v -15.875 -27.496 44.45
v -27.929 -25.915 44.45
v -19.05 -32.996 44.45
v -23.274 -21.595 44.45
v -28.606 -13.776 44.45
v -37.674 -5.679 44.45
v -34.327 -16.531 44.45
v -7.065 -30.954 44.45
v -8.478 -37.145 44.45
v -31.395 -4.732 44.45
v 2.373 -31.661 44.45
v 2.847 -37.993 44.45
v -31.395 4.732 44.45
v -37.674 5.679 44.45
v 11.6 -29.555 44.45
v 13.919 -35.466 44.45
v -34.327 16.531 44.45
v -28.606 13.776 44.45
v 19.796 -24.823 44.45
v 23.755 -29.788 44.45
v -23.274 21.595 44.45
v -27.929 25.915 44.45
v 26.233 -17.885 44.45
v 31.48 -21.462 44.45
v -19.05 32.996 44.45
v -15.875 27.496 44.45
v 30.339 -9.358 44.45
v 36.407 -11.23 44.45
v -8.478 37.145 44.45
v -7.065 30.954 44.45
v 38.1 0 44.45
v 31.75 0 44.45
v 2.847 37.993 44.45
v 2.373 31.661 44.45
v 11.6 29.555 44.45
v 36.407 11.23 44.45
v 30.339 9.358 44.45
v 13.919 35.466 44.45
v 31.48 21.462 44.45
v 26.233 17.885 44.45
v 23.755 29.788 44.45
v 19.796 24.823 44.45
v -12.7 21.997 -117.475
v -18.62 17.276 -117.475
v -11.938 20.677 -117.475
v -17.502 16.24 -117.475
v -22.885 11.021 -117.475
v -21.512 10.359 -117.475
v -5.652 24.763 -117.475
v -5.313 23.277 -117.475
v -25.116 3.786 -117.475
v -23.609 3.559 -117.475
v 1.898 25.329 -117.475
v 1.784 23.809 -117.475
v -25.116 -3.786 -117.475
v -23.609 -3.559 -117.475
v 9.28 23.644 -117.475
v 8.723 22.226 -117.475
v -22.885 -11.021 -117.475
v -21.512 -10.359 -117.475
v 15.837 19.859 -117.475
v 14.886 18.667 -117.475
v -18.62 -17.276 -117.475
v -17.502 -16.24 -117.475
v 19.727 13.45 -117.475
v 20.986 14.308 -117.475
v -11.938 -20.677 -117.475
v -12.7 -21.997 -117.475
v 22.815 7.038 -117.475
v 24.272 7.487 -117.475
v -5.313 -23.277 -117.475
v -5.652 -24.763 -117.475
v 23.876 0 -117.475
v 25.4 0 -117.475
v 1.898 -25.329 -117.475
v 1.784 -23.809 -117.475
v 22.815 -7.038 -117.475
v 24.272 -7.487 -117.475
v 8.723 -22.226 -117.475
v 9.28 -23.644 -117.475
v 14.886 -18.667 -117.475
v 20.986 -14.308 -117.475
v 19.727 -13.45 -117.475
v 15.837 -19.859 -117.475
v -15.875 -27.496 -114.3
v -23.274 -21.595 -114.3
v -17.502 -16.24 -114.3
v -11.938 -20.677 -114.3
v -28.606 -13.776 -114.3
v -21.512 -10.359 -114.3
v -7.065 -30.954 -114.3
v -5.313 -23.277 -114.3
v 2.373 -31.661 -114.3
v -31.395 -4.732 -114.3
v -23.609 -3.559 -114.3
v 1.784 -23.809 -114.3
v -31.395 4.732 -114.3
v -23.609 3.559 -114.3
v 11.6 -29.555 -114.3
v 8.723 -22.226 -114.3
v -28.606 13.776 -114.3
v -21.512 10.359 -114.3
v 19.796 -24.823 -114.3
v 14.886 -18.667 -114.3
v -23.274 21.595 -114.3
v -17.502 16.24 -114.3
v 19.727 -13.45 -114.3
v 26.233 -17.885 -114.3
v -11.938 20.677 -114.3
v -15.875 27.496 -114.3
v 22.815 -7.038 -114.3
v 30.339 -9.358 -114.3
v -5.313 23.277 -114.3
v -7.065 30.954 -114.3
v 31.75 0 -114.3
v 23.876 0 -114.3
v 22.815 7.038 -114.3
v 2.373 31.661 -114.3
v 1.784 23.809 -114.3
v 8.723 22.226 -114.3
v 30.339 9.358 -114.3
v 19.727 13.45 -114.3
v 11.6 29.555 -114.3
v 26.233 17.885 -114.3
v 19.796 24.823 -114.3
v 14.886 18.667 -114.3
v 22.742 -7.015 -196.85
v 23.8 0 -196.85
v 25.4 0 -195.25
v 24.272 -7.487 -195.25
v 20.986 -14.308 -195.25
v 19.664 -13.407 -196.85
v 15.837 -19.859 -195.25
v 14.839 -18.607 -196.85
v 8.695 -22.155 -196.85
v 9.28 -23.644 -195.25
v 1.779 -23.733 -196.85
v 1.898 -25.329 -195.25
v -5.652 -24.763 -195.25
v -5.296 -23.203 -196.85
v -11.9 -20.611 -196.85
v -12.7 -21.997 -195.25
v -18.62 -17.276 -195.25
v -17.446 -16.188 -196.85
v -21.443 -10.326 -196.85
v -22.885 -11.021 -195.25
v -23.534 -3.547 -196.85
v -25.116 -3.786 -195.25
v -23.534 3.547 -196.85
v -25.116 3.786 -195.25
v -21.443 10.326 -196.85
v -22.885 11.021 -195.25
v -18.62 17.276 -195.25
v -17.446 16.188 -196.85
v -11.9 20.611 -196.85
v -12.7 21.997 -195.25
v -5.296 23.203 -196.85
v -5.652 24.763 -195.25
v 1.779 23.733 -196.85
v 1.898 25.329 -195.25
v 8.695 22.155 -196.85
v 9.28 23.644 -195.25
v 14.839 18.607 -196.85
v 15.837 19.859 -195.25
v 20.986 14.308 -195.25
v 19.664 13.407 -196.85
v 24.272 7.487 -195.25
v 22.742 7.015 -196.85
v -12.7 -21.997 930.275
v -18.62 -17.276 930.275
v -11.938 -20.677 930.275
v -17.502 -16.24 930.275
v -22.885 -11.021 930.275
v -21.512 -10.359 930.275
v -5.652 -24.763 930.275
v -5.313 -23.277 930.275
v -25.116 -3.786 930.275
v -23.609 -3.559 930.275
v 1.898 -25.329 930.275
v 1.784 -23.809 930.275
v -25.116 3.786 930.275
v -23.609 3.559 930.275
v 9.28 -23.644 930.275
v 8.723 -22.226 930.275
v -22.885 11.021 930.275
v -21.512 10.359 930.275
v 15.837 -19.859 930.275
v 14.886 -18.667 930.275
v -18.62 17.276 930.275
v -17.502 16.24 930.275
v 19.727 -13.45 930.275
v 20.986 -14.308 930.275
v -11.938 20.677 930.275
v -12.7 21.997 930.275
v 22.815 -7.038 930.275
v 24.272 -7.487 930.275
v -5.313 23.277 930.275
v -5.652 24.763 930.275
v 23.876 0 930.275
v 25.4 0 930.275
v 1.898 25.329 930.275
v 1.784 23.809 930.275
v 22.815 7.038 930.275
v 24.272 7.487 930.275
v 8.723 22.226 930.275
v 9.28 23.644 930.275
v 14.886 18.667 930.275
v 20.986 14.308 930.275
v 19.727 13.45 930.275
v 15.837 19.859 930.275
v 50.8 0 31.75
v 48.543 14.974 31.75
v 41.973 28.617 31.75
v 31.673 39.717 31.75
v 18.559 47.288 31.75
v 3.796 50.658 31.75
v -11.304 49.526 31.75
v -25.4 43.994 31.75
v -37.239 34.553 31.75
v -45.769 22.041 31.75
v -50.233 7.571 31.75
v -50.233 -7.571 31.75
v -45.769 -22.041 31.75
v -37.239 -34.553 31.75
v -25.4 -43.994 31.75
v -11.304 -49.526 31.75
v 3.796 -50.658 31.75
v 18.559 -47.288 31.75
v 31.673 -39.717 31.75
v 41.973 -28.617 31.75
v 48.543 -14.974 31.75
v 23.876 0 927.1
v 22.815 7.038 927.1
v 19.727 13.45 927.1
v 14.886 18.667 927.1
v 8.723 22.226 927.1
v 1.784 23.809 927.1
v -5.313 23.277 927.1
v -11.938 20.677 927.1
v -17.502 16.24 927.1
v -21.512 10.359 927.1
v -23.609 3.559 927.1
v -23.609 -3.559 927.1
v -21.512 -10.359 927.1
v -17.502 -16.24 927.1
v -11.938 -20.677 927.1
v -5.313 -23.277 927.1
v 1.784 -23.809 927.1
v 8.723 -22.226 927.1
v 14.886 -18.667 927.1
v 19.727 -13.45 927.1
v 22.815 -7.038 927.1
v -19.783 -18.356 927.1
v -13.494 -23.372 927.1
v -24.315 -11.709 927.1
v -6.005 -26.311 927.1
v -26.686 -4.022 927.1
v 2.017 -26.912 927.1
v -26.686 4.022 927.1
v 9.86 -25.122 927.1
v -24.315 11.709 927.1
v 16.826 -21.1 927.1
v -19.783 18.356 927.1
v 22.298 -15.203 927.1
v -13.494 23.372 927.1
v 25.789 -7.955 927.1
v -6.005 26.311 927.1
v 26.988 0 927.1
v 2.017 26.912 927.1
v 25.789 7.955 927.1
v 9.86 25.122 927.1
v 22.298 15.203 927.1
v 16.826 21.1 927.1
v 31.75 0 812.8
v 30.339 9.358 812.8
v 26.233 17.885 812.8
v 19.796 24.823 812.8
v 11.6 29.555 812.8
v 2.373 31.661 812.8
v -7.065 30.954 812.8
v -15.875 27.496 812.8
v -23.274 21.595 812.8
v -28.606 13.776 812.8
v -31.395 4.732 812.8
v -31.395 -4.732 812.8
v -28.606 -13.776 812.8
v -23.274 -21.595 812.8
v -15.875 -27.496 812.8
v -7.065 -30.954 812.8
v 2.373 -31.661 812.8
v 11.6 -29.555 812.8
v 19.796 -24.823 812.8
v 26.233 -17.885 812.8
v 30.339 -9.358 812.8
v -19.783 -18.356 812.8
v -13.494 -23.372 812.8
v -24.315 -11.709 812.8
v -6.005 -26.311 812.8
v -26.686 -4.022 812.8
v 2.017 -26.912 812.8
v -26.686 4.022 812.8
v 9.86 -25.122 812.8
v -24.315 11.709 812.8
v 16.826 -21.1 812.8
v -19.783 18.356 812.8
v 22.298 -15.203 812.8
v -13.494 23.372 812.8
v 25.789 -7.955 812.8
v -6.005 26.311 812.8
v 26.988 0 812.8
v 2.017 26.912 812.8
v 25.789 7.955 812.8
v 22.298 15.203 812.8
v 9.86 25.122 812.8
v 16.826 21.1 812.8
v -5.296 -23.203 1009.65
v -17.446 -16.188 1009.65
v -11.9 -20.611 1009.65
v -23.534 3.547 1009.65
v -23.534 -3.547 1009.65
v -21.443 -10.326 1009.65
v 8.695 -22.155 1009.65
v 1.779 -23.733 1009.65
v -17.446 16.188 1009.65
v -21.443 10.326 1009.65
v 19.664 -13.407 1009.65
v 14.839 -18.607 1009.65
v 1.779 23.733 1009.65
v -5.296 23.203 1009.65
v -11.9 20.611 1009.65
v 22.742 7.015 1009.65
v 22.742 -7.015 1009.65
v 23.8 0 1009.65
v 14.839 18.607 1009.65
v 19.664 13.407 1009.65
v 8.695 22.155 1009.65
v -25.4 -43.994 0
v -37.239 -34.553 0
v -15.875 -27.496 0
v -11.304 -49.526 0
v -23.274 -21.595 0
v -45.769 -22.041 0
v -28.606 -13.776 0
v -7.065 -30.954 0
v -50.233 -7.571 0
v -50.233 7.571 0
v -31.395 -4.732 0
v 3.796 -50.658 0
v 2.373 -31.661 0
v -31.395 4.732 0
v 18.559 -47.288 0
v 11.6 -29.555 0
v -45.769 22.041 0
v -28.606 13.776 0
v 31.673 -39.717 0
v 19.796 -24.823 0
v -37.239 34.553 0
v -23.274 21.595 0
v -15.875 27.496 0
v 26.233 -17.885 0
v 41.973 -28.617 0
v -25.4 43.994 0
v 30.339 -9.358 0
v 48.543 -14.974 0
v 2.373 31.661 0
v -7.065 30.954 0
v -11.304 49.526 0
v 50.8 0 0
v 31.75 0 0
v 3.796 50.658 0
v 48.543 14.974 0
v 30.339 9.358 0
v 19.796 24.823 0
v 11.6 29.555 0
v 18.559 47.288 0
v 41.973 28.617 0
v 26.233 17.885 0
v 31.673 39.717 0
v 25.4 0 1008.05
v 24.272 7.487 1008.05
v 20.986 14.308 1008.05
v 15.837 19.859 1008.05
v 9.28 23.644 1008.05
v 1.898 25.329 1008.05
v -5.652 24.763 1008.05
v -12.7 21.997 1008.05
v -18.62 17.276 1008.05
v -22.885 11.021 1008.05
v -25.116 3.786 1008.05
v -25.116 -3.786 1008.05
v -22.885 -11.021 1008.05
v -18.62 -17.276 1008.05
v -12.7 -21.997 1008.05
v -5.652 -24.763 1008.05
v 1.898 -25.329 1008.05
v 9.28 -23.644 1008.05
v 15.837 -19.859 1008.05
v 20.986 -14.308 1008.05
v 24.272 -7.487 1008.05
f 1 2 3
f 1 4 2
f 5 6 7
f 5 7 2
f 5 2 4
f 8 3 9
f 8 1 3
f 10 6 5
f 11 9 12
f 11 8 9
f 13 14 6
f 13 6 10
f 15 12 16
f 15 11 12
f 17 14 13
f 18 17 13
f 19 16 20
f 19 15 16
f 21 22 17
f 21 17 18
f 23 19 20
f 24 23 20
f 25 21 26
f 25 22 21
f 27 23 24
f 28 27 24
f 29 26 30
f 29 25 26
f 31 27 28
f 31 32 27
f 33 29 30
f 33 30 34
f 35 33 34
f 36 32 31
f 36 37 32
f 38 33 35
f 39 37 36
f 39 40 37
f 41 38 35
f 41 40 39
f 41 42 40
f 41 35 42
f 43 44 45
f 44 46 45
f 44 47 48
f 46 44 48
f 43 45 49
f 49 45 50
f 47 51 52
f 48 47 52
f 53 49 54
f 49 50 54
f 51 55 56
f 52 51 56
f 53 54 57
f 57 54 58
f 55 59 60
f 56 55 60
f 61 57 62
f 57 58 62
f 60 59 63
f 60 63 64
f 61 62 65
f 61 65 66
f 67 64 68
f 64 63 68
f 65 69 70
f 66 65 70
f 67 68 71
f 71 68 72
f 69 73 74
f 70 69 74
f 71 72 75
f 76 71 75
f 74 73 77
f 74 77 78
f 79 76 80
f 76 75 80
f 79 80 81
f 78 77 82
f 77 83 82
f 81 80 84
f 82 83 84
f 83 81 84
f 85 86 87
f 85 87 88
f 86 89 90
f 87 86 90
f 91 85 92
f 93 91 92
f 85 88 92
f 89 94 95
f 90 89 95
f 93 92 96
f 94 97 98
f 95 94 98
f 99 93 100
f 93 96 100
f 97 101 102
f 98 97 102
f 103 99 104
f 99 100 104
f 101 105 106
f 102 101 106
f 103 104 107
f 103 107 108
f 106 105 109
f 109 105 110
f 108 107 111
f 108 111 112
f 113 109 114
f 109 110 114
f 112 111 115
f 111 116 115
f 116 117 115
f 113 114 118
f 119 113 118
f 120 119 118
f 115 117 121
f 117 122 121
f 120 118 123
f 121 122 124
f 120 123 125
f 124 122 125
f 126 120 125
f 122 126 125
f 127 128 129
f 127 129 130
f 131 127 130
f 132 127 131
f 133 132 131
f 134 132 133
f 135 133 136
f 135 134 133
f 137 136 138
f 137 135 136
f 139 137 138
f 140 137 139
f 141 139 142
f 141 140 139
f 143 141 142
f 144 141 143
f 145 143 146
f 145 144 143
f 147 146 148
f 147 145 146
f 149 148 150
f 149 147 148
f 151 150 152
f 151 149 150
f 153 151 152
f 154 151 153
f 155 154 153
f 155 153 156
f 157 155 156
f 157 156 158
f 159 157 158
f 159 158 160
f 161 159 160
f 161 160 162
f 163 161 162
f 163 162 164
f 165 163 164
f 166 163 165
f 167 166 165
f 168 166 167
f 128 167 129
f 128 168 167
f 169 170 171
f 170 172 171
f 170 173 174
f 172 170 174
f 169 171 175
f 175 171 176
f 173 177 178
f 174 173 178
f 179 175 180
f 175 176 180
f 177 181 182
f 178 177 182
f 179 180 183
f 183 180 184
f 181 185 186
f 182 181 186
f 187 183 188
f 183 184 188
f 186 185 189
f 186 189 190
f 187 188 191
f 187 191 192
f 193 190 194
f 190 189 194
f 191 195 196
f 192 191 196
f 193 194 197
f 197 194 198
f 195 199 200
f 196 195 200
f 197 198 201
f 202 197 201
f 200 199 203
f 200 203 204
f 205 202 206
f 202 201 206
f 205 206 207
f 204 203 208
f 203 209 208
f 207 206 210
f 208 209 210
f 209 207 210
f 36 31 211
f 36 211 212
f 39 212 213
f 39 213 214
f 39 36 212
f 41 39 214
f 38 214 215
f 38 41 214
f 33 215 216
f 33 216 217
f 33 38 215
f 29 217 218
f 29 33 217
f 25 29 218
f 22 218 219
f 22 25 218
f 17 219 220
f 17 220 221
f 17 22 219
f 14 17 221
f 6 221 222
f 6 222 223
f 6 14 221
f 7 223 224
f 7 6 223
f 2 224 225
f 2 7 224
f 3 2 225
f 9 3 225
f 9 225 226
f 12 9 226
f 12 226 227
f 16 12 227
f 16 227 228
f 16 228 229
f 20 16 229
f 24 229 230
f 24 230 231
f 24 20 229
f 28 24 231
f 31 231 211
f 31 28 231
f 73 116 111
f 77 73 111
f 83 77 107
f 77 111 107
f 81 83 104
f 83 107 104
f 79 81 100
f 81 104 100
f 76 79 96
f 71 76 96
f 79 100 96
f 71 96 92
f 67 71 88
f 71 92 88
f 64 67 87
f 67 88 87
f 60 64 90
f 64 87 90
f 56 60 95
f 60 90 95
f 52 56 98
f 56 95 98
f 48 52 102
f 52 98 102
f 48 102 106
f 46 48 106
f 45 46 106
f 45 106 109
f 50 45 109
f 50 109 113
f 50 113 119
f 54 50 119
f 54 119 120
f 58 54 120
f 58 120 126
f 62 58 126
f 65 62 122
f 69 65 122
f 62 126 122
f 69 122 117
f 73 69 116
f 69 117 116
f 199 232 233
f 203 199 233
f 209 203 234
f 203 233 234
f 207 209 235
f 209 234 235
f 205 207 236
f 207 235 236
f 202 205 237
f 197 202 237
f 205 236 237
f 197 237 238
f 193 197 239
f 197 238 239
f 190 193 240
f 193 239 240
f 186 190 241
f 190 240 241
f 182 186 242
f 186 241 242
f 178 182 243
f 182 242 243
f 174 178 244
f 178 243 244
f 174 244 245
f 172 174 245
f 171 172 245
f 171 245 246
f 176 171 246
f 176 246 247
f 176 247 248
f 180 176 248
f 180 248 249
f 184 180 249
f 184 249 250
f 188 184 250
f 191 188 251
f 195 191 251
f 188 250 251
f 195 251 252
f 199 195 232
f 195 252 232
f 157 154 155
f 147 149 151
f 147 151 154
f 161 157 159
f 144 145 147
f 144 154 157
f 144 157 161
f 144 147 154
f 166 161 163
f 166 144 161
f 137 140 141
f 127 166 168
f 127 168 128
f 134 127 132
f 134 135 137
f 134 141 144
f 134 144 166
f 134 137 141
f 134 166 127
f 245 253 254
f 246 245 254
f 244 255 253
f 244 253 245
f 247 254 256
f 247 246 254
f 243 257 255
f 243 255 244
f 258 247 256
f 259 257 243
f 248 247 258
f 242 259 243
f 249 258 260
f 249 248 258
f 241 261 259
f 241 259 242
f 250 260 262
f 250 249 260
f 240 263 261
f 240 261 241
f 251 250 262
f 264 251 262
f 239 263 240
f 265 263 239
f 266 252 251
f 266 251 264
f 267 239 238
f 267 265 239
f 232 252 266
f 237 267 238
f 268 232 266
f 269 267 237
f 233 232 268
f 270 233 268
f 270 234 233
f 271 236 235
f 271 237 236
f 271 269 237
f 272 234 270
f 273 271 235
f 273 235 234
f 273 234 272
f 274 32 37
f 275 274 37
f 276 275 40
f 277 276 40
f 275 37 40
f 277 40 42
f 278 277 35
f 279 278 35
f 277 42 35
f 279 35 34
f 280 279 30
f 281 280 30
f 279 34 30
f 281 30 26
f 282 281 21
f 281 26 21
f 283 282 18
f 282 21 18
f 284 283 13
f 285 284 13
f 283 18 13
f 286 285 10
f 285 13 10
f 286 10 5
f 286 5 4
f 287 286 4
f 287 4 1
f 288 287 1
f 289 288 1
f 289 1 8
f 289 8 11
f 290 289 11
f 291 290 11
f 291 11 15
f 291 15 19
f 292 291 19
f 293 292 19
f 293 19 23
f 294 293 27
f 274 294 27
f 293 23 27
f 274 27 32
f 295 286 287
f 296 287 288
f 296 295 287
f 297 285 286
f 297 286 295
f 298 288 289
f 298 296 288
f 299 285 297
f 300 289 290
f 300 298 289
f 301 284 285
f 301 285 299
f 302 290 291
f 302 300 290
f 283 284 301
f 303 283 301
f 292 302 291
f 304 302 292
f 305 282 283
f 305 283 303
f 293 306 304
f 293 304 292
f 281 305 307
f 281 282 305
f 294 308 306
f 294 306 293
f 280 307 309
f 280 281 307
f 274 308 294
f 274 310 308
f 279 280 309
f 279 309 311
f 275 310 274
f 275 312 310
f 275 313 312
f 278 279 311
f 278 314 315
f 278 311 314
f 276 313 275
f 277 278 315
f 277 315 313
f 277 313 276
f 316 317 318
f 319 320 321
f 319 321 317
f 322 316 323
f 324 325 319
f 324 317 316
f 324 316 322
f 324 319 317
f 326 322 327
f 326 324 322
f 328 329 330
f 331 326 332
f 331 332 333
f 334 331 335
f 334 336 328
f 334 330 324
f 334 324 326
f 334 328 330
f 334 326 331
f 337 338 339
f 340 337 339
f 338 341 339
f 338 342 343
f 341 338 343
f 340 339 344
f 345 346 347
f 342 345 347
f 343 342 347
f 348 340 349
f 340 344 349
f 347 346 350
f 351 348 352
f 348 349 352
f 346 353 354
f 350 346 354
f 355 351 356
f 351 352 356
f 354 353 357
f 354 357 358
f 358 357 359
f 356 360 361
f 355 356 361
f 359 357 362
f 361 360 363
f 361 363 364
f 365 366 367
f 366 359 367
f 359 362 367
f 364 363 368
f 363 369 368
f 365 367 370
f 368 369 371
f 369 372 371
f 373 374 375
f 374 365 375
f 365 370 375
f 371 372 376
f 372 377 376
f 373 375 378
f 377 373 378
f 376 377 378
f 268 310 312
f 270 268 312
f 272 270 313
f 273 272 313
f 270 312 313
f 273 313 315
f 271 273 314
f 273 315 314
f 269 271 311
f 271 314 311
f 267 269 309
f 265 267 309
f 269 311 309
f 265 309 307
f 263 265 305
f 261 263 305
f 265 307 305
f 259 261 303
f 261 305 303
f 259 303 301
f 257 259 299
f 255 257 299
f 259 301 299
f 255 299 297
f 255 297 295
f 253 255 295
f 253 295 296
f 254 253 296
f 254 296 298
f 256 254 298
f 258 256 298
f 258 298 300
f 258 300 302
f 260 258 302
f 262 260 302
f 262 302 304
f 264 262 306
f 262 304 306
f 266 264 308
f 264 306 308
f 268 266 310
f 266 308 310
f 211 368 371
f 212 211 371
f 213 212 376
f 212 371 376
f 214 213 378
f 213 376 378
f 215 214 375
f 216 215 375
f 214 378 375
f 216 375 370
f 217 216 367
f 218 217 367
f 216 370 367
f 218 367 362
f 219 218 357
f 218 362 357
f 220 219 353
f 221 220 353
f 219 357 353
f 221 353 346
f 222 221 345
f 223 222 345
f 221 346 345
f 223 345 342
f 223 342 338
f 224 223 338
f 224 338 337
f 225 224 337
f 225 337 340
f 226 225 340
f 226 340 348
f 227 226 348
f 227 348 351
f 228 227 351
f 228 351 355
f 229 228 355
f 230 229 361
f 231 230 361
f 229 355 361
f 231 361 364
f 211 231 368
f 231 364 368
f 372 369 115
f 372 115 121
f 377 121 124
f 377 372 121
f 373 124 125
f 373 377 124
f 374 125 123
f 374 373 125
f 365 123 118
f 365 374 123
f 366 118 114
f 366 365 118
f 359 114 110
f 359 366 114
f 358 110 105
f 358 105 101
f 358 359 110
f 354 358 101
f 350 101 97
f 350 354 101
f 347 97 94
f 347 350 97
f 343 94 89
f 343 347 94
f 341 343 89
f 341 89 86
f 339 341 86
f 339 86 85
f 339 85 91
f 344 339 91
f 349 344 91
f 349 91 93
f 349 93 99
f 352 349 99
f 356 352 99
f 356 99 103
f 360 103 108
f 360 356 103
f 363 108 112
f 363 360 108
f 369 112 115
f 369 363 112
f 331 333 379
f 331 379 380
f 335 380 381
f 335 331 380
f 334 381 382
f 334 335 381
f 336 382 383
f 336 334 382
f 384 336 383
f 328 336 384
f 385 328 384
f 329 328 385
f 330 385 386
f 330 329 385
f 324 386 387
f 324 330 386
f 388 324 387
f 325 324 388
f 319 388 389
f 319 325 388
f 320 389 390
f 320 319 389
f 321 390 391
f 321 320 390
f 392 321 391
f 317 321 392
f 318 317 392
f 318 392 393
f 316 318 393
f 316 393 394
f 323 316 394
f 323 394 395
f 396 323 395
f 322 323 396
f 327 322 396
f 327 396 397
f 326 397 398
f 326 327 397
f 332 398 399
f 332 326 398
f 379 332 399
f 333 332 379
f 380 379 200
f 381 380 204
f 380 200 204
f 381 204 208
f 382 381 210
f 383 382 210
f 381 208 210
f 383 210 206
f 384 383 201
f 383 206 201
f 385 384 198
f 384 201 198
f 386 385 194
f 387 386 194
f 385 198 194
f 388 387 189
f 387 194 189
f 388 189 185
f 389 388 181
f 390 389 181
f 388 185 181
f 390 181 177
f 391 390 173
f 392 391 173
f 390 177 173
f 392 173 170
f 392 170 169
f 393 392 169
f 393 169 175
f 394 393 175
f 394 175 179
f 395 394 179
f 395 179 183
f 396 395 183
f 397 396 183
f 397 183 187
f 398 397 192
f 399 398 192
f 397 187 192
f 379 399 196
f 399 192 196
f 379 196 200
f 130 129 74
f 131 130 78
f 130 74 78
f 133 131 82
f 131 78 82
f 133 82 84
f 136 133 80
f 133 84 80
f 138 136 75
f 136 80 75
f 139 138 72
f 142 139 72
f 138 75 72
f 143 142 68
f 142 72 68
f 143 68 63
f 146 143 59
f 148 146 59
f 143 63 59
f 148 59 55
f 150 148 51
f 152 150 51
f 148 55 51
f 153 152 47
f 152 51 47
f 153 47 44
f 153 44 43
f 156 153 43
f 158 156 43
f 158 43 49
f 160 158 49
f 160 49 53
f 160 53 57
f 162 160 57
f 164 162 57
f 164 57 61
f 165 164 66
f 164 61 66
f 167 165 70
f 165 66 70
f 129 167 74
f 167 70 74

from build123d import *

# Parameters (mm, degrees)
F0_R      = 31.75
F1_DEPTH  = 114.3
F2_R      = 23.876
F3_DEPTH  = 3.175
F4_R      = 25.4
F5_DEPTH  = 79.375
F6_SIZE   = 1.6002
F7_R      = 50.8
F8_DEPTH  = 44.45
F9_SIZE   = 12.7
F10_R     = 31.75
F11_DEPTH = 768.35
F12_R     = 26.9875
F13_DEPTH = 114.3
F14_R     = 23.876
F15_DEPTH = 3.175
F16_R     = 25.4
F17_DEPTH = 79.375
F18_SIZE  = 1.6002


with BuildPart() as f1:
    # F0 (on Top) → F1 (new body)
    with BuildSketch(Plane.XY):
        Circle(F0_R)
    extrude(amount=-F1_DEPTH)

    # F2 (on face) → F3 (join)
    with BuildSketch(Plane(origin=(0, 0, -114.3), x_dir=(1, 0, 0), z_dir=(0, 0, -1))):
        Circle(F2_R)
    extrude(amount=F3_DEPTH)

    # F4 (on face) → F5 (join)
    with BuildSketch(Plane(origin=(0, 0, -117.475), x_dir=(1, 0, 0), z_dir=(0, 0, -1))):
        Circle(F4_R)
    extrude(amount=F5_DEPTH)

    # F6
    f6_edges = [f1.edges().sort_by_distance(p)[0] for p in [
        (-25.4, 0, -196.85),
    ]]
    chamfer(f6_edges, length=F6_SIZE)

    # F7 (on face) → F8 (join)
    with BuildSketch(Plane.XY):
        Circle(F7_R)
    extrude(amount=F8_DEPTH)

    # F9
    f9_edges = [f1.edges().sort_by_distance(p)[0] for p in [
        (-50.8, 0, 44.45),
    ]]
    chamfer(f9_edges, length=F9_SIZE)

    # F10 (on face) → F11 (join)
    with BuildSketch(Plane.XY.offset(44.45)):
        Circle(F10_R)
    extrude(amount=F11_DEPTH)

    # F12 (on face) → F13 (join)
    with BuildSketch(Plane.XY.offset(812.8)):
        Circle(F12_R)
    extrude(amount=F13_DEPTH)

    # F14 (on face) → F15 (join)
    with BuildSketch(Plane.XY.offset(927.1)):
        Circle(F14_R)
    extrude(amount=F15_DEPTH)

    # F16 (on face) → F17 (join)
    with BuildSketch(Plane.XY.offset(930.275)):
        Circle(F16_R)
    extrude(amount=F17_DEPTH)

    # F18
    f18_edges = [f1.edges().sort_by_distance(p)[0] for p in [
        (-25.4, 0, 1009.65),
    ]]
    chamfer(f18_edges, length=F18_SIZE)


solid = f1.part
